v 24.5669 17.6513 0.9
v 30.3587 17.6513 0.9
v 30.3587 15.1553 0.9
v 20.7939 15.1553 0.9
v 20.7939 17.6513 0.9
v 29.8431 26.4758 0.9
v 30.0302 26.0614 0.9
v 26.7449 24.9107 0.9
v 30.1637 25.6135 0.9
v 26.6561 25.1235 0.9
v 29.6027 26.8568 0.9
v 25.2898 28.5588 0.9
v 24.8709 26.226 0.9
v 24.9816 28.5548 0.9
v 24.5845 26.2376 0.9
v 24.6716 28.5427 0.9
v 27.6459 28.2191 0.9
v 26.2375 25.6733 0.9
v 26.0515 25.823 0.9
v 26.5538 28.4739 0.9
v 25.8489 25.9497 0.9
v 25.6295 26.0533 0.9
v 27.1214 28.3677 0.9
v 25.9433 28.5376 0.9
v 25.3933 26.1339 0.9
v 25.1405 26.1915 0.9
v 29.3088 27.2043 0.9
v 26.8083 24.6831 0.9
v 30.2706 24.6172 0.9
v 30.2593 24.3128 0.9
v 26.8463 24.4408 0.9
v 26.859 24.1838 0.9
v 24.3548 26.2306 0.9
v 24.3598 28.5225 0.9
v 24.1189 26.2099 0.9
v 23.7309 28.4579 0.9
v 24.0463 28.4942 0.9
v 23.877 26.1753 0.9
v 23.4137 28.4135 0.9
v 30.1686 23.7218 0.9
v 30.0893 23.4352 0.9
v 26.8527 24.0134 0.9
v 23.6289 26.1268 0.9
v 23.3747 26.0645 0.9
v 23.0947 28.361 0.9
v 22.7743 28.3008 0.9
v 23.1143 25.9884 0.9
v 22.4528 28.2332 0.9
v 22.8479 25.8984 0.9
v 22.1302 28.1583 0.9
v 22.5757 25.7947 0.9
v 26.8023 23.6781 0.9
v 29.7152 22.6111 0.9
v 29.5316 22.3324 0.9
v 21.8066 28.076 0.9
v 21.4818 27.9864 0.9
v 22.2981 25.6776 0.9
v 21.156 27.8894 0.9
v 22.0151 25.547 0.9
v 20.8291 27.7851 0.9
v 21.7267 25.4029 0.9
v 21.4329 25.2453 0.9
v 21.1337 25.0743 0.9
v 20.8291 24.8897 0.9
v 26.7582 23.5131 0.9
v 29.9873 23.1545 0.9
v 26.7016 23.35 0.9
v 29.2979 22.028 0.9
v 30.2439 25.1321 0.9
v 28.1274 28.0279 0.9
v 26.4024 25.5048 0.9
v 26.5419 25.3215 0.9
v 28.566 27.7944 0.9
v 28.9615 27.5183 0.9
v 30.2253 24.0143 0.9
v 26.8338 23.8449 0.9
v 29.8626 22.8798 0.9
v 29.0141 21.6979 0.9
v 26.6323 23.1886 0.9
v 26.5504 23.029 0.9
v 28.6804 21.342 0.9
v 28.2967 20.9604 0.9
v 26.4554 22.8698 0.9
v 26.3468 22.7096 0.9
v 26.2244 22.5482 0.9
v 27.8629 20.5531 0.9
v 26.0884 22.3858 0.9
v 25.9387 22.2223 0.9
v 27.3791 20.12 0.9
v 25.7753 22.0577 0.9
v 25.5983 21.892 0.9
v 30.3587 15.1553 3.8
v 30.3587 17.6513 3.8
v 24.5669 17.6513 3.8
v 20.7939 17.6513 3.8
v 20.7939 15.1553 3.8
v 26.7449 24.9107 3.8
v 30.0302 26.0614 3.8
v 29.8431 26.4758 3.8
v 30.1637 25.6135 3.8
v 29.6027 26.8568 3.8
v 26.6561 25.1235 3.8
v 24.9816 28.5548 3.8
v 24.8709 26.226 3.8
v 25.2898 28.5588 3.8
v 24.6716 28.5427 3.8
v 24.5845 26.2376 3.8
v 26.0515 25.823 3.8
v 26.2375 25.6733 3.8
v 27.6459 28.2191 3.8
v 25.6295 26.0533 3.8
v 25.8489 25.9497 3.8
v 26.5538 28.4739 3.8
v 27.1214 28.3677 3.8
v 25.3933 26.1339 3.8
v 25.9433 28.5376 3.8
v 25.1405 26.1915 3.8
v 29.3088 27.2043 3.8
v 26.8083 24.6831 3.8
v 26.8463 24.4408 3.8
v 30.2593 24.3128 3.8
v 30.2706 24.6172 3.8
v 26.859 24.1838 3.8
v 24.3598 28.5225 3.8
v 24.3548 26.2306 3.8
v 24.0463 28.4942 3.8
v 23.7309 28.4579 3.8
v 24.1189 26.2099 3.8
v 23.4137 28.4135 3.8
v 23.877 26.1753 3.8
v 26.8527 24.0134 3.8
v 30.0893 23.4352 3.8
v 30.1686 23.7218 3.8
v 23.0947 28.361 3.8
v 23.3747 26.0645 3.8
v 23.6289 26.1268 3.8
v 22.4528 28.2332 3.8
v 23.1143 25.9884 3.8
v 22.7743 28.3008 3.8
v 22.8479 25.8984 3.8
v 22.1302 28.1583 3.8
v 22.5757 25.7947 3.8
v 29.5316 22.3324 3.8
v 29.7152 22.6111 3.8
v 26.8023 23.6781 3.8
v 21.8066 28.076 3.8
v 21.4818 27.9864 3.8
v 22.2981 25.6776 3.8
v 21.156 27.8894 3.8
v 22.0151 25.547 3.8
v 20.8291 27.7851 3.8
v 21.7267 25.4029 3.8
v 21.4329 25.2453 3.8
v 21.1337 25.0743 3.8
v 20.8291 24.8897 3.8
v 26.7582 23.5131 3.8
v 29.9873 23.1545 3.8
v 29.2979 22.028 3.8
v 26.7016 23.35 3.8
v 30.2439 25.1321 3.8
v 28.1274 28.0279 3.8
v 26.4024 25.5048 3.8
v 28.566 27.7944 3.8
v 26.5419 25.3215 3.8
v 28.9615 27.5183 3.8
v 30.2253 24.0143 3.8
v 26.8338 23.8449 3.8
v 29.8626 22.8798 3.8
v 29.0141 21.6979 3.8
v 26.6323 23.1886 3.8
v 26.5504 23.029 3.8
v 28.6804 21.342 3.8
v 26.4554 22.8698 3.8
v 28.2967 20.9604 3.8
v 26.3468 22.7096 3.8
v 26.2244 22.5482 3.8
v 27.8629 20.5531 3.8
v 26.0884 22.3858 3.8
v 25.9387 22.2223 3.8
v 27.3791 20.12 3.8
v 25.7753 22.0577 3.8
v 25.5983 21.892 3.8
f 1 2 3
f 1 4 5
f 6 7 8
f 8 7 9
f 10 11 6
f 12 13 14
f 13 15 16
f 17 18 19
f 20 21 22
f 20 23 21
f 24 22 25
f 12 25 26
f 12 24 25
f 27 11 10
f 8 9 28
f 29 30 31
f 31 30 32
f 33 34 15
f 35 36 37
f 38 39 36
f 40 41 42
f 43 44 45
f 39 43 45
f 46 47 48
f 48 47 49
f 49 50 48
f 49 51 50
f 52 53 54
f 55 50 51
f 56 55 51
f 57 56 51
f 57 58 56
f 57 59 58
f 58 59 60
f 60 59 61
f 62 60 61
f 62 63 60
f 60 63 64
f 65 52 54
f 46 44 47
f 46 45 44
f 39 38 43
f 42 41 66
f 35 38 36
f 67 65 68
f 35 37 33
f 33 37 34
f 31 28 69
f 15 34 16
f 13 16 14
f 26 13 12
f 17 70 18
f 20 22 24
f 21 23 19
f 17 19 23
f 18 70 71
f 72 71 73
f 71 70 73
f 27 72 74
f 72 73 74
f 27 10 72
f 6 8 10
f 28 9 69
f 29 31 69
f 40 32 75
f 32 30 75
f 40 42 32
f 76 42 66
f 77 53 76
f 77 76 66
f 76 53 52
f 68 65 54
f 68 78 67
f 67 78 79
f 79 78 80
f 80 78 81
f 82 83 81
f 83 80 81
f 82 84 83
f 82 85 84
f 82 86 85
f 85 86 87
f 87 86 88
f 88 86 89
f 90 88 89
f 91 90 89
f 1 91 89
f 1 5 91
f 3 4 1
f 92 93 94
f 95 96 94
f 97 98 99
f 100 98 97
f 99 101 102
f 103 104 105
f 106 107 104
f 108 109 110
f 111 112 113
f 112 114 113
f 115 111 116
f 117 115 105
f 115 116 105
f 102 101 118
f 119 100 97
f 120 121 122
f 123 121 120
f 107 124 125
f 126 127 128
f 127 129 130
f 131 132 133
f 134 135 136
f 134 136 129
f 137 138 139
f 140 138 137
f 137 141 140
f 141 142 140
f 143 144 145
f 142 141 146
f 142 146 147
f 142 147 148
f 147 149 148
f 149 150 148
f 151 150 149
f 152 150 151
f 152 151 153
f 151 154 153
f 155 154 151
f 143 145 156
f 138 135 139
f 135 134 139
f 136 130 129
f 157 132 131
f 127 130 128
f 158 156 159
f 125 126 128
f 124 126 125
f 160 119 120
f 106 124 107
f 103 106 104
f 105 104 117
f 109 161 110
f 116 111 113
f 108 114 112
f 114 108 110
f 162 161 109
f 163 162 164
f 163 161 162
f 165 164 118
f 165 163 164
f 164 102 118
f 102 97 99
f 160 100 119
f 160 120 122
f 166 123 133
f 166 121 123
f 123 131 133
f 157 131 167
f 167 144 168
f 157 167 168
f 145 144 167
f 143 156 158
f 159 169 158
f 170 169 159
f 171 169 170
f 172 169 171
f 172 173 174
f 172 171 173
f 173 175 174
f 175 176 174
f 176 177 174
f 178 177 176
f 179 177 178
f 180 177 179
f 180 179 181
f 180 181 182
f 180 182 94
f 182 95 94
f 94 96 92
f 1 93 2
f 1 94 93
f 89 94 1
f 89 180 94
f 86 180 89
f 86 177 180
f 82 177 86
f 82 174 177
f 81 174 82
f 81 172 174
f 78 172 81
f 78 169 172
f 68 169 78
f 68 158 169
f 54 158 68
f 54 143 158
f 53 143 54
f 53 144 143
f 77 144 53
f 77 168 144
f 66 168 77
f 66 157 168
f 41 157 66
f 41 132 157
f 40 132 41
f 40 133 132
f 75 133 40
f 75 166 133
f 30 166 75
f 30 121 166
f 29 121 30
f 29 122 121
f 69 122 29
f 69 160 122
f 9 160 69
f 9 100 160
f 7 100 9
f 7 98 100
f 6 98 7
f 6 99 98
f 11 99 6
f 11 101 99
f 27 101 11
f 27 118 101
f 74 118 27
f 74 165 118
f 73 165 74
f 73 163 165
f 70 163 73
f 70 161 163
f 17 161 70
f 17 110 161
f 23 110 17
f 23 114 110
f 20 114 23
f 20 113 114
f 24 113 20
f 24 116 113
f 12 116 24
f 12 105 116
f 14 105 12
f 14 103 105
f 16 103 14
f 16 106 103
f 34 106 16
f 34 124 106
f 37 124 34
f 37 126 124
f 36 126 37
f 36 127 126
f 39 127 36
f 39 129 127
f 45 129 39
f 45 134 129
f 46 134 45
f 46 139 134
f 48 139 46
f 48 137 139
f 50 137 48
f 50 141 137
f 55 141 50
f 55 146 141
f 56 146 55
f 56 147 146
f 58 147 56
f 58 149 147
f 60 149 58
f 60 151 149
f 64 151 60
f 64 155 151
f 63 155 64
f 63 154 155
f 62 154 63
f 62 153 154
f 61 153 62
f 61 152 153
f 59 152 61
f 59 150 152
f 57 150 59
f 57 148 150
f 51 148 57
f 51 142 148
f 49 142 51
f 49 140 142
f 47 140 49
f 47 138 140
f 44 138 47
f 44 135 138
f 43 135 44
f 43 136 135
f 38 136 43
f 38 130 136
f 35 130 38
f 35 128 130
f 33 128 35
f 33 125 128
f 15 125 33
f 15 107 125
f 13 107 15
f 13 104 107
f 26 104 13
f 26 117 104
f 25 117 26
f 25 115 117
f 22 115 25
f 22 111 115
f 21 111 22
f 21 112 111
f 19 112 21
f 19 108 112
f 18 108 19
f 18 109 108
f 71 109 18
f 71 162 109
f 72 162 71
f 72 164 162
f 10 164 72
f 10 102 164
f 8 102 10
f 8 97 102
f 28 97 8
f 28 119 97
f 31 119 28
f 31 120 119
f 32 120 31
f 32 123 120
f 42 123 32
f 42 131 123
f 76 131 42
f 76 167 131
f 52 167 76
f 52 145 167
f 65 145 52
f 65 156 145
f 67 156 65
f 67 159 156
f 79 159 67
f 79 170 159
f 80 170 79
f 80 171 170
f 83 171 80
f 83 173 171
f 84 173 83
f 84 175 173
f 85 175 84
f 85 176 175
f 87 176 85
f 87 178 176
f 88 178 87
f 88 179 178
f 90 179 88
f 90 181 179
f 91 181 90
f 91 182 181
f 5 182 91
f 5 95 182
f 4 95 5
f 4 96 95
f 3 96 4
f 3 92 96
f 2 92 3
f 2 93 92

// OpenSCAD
$fn = 48;
  translate([25.500, 21.700, 0.900])
    linear_extrude(height=2.900)
      text("2", size=13.000, halign="center", valign="center", font="Helvetica Neue:style=Bold");
